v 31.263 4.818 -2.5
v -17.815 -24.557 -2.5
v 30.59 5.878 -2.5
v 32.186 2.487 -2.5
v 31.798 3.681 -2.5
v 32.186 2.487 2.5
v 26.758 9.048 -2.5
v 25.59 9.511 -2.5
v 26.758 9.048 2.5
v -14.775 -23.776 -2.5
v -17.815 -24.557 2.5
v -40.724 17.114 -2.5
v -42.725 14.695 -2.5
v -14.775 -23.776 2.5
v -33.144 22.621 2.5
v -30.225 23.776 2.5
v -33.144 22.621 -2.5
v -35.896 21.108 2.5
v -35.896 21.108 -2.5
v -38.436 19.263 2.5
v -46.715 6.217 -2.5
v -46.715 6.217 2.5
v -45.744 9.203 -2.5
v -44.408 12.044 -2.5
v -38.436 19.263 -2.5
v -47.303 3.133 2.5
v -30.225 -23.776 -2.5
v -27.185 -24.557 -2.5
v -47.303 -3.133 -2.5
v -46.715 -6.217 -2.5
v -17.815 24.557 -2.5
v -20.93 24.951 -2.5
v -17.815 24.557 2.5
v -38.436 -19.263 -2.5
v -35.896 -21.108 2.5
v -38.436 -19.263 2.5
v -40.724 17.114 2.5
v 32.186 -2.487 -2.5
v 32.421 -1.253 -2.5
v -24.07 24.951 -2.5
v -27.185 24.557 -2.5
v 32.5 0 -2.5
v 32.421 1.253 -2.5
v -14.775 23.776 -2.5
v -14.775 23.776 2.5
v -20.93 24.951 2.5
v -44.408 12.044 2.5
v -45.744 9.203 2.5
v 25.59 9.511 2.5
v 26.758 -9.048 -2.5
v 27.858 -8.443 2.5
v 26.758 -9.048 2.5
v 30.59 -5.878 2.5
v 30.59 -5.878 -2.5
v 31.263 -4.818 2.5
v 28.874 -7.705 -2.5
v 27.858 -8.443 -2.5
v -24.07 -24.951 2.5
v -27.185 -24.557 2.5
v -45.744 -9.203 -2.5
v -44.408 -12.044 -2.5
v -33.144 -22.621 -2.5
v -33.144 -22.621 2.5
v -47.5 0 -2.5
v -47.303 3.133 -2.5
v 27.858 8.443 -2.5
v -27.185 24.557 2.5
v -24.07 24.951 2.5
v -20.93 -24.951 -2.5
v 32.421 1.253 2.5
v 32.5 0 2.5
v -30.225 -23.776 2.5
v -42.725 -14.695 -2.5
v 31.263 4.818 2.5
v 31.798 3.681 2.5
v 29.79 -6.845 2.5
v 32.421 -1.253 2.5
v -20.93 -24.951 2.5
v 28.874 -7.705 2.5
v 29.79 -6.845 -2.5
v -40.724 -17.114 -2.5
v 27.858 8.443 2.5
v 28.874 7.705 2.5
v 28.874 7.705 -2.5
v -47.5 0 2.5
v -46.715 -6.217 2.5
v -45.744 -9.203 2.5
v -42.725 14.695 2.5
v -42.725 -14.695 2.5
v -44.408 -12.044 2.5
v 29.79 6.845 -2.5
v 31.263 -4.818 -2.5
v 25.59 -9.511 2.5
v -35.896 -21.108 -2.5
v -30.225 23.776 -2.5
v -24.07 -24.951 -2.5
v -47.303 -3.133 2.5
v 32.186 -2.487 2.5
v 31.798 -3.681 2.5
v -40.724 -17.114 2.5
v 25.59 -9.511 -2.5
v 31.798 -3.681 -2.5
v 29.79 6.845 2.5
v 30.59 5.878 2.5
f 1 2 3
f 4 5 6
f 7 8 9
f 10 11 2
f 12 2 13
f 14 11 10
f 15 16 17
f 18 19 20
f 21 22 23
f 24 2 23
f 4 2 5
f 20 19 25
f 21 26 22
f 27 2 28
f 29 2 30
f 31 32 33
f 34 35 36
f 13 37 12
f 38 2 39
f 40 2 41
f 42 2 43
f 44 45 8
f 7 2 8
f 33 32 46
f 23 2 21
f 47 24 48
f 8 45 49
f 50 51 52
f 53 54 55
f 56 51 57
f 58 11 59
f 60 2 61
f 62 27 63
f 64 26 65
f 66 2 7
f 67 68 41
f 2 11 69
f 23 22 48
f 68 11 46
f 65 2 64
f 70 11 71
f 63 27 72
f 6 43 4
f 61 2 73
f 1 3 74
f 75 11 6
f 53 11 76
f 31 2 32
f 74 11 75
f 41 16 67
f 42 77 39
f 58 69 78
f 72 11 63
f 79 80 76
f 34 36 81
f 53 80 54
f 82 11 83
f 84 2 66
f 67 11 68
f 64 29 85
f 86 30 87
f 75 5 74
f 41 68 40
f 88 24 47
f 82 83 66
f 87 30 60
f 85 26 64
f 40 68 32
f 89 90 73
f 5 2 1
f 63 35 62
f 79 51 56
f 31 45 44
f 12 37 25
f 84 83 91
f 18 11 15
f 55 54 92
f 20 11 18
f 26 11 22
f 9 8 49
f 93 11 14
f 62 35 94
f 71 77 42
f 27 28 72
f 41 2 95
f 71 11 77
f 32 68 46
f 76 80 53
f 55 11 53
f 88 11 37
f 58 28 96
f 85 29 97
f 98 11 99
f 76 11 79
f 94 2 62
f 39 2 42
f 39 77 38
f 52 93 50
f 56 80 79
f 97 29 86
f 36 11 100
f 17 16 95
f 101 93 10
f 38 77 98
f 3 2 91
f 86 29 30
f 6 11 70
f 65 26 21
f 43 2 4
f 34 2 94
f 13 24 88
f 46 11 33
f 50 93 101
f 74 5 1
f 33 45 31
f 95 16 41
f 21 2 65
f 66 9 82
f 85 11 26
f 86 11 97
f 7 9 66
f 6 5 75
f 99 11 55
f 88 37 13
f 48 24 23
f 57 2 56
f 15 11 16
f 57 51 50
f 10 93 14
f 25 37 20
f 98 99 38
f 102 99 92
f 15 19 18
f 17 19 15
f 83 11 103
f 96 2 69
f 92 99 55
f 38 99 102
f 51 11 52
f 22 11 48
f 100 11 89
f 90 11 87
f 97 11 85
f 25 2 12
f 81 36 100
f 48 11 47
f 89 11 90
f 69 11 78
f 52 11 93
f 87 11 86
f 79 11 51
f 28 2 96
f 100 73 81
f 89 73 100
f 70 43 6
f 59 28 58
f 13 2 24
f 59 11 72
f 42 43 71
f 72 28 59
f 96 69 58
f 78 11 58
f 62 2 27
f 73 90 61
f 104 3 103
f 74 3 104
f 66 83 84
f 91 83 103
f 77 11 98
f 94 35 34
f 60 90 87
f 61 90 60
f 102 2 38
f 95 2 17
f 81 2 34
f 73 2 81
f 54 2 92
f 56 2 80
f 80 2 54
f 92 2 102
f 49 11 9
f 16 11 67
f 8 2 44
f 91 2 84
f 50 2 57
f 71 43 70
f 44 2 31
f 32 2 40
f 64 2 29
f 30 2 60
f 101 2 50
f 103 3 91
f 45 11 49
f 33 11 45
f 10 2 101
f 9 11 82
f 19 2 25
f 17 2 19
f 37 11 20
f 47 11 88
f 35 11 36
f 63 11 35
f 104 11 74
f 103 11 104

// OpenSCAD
//-------- Parametros de la pieza
r1 = 25;  //-- Radio cilindro 1
r2 = 10;  //-- Radio cilindro 2
th = 5;   //-- Grosor

//-- Distancia entre los centros de los cilincros
d = r1 + r2 + 10;

//-- Crear el objetco convexo minimo que contiene ls dos
//-- cilindros
hull() {

  //-- Cilindro 1
  translate([-d/2, 0, 0])
    cylinder(r = r1, h = th, center = true, $fn = 50);
    
  //-- Cilincro 2
  translate([d/2, 0, 0])
    cylinder(r = r2, h = th, center = true, $fn = 50);
}
